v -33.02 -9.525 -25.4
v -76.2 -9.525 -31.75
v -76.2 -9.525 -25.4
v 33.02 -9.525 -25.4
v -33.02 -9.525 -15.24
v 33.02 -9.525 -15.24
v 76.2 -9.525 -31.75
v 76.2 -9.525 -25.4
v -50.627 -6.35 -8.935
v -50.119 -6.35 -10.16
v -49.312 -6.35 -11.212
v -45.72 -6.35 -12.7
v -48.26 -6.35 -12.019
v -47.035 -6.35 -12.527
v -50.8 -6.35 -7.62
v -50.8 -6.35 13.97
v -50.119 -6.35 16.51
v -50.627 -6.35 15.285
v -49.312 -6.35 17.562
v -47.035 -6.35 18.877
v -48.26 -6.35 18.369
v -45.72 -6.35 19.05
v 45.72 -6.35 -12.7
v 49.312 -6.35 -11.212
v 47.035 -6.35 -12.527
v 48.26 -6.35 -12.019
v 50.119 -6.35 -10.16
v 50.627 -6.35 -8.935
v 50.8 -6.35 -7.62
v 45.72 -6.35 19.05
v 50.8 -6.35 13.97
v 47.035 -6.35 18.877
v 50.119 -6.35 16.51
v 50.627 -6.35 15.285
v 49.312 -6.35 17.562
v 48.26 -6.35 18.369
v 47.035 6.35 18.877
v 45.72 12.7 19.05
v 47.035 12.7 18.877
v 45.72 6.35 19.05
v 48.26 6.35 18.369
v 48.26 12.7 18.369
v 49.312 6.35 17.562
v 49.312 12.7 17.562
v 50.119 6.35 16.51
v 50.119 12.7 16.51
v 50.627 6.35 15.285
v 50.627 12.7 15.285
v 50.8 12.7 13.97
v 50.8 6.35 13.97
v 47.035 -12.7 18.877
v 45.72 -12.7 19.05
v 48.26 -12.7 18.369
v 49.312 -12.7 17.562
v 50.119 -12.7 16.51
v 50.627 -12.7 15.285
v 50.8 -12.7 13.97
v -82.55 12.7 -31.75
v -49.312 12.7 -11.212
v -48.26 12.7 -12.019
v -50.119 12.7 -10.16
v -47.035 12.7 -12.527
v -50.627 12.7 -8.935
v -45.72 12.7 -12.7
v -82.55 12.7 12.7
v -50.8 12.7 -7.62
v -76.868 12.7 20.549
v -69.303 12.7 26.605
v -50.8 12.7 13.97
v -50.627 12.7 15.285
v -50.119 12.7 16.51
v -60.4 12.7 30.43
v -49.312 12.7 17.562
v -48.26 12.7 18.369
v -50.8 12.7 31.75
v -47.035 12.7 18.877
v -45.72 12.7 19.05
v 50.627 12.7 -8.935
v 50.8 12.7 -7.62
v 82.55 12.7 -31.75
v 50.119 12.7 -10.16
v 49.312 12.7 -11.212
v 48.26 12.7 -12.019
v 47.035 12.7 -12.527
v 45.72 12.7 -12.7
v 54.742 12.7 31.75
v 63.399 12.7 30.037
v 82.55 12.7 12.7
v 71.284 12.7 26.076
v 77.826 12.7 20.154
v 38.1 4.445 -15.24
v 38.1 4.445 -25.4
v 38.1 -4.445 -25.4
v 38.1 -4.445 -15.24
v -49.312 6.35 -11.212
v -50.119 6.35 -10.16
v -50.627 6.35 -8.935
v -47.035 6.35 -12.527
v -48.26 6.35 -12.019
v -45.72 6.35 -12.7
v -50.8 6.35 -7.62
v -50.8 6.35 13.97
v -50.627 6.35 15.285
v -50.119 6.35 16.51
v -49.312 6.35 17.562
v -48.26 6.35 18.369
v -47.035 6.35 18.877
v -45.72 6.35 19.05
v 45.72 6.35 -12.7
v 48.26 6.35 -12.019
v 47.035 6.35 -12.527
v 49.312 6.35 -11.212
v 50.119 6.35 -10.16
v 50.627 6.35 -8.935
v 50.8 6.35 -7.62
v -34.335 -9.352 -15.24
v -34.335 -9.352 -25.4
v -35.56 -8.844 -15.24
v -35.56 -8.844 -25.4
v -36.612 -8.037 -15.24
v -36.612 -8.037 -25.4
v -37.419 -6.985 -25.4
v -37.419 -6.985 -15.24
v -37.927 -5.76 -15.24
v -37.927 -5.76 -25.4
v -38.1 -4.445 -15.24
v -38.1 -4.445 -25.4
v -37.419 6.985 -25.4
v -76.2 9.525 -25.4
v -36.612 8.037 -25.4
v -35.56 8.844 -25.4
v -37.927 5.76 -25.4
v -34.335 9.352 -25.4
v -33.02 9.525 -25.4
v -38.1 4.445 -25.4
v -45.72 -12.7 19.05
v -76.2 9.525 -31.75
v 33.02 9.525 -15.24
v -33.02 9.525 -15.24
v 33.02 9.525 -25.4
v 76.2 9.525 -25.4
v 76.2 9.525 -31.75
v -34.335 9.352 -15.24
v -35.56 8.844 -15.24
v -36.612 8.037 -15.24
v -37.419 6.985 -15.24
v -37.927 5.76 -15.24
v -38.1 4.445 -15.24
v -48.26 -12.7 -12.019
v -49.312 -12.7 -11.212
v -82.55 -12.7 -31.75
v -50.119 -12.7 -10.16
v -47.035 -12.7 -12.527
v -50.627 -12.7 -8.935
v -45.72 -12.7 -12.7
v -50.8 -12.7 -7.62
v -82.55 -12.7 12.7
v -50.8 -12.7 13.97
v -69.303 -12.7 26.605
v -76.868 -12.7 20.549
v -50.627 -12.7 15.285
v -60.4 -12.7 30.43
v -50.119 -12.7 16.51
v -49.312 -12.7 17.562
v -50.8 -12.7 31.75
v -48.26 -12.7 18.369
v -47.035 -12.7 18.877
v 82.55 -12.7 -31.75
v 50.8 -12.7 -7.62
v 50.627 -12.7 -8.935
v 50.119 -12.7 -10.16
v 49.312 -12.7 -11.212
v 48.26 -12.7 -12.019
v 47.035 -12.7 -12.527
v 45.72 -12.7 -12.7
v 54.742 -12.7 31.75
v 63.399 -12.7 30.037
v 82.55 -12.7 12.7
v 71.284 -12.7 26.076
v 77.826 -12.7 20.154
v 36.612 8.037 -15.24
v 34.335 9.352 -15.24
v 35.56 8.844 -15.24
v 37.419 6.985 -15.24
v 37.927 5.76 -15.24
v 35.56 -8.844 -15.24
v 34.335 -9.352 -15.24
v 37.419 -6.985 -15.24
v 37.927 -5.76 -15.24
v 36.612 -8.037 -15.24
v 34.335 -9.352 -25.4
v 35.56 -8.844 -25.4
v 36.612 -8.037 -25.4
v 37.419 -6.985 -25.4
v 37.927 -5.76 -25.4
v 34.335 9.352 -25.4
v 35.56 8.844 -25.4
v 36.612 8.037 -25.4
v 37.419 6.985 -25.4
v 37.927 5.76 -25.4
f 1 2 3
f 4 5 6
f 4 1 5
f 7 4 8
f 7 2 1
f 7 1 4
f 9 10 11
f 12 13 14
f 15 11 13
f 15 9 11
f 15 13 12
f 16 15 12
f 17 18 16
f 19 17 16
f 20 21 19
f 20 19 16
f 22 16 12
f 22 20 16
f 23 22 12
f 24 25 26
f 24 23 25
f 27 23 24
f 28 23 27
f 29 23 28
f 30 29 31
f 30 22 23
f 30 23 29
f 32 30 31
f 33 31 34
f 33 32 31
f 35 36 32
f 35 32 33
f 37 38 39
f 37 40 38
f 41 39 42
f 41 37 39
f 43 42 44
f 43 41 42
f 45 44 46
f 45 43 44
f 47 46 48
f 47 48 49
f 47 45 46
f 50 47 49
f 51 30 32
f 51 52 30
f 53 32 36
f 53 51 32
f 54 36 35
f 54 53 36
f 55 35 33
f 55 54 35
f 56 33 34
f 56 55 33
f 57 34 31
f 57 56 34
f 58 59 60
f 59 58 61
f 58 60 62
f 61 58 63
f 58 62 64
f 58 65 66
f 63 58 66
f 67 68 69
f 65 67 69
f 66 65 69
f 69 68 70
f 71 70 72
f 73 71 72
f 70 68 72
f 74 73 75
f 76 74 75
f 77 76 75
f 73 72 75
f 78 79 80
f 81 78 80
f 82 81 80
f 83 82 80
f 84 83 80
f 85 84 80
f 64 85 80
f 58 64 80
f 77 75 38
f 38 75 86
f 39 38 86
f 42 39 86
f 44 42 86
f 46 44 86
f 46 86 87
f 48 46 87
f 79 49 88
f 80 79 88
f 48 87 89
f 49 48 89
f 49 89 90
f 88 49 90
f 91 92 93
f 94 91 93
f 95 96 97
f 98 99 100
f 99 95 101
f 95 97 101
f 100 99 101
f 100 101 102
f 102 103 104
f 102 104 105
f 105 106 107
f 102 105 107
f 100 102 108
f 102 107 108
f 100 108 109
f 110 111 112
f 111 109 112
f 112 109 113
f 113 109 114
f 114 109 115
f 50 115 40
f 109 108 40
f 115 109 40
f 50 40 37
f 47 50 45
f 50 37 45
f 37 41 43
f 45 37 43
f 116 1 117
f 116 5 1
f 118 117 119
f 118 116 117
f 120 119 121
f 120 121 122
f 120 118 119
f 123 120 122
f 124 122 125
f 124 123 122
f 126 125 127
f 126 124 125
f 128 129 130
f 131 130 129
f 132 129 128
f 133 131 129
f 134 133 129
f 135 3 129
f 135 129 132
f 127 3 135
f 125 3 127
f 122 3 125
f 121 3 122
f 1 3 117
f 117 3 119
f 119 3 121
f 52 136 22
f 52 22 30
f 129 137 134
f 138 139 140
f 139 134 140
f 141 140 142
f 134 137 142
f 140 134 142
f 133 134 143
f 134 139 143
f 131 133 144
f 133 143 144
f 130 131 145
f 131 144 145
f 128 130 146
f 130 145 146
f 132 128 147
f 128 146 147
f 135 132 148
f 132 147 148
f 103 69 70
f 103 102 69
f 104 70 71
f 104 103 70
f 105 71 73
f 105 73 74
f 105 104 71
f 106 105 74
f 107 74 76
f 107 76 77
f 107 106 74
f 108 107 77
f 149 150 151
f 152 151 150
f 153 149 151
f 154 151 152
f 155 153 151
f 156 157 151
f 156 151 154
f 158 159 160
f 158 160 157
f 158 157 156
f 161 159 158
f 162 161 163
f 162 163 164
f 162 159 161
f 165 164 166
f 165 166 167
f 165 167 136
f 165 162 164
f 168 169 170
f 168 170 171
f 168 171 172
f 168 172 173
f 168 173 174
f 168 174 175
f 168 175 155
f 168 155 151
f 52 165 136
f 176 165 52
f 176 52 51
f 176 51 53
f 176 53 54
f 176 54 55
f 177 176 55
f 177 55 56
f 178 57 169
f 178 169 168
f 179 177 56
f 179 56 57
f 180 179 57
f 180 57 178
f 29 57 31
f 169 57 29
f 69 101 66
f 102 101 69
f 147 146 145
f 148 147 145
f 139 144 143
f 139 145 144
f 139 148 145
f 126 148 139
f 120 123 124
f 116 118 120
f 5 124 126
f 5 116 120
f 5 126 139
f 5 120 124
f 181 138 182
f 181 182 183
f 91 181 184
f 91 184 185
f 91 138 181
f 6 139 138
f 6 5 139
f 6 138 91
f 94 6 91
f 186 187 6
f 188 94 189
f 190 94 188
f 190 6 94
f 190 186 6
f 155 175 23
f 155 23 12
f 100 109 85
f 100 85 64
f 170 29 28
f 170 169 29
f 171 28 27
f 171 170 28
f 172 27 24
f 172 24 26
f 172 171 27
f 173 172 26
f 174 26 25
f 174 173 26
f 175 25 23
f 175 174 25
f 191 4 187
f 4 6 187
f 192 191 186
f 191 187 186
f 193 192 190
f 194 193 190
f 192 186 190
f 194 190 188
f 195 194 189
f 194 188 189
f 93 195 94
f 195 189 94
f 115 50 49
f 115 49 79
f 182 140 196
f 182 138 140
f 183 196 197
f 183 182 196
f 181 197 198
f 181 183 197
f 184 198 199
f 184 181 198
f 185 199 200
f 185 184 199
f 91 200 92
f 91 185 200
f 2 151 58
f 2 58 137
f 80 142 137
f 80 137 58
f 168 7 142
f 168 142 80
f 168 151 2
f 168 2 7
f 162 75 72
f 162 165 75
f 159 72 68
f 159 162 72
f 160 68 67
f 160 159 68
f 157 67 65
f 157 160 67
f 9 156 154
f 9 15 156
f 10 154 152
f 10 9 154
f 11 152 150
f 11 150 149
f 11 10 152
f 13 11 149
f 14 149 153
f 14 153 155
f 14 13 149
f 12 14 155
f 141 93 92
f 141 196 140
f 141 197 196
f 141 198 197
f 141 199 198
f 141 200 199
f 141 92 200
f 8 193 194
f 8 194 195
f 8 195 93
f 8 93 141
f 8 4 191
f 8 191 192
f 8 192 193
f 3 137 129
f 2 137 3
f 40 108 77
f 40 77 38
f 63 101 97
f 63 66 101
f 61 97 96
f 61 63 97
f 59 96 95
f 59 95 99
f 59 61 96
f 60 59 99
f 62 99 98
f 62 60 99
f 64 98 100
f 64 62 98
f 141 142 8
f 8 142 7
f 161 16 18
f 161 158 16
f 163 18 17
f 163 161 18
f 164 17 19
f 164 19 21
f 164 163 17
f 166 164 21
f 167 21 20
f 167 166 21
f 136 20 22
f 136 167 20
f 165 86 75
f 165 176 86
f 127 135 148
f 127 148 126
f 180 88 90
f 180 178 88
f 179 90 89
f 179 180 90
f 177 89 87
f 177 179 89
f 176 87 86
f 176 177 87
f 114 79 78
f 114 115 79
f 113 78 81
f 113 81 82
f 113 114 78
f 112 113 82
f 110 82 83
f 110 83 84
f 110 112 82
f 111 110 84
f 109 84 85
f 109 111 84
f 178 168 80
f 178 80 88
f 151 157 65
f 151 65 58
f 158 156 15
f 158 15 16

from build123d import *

# Parameters (mm, degrees)
F0_W     = 101.6
F0_H     = 12.7
F1_DEPTH = 12.7
F0_H_2   = 31.75
F2_DEPTH = 6.35
F3_W     = 152.4
F3_H     = 19.05
F4_DEPTH = 6.35
F5_W     = 76.2
F5_H     = 19.05
F6_DEPTH = 10.16
F7_R     = 5.08


with BuildPart() as f1:
    # F0 (on Front) → F1 (new body, symmetric)
    with BuildSketch(Plane.XZ):
        with BuildLine():
            Line((-50.8, 19.05), (-50.8, 31.75))
            ThreePointArc((-50.8, 31.75), (-69.3027203169, 26.6045338614), (-82.55, 12.7))
            Line((-82.55, 12.7), (-82.55, -31.75))
            Line((-82.55, -31.75), (-50.8, -31.75))
            Line((-50.8, -31.75), (-50.8, -12.7))
            Line((-50.8, -12.7), (-50.8, 19.05))
        make_face()
        with Locations((0, 25.4)):
            Rectangle(F0_W, F0_H)
        with BuildLine():
            Line((54.74242965, 31.75), (50.8, 31.75))
            Line((50.8, 31.75), (50.8, 19.05))
            Line((50.8, 19.05), (50.8, -12.7))
            Line((50.8, -12.7), (-50.8, -12.7))
            Line((-50.8, -12.7), (-50.8, -31.75))
            Line((-50.8, -31.75), (82.55, -31.75))
            Line((82.55, -31.75), (82.55, 12.7))
            ThreePointArc((82.55, 12.7), (71.2844870911, 26.0761255456), (54.74242965, 31.75))
        make_face()
    extrude(amount=F1_DEPTH, both=True)

    # F0 (on Front) → F2 (join, symmetric)
    with BuildSketch(Plane.XZ):
        with Locations((0, 3.175)):
            Rectangle(F0_W, F0_H_2)
    extrude(amount=F2_DEPTH, both=True)

    # F3 (on face) → F4 (cut)
    with BuildSketch(Plane(origin=(0, 0, -31.75), x_dir=(1, 0, 0), z_dir=(0, 0, -1))):
        Rectangle(F3_W, F3_H)
    extrude(amount=-F4_DEPTH, mode=Mode.SUBTRACT)

    # F5 (on face) → F6 (cut)
    with BuildSketch(Plane(origin=(0, 0, -25.4), x_dir=(1, 0, 0), z_dir=(0, 0, -1))):
        Rectangle(F5_W, F5_H)
    extrude(amount=-F6_DEPTH, mode=Mode.SUBTRACT)

    # F7
    f7_edges = [f1.edges().sort_by_distance(p)[0] for p in [
        (-38.1, -9.525, -20.32),
        (38.1, -9.525, -20.32),
        (38.1, 9.525, -20.32),
        (-38.1, 9.525, -20.32),
        (-50.8, -9.525, 19.05),
        (-50.8, -9.525, -12.7),
        (50.8, -9.525, 19.05),
        (50.8, -9.525, -12.7),
        (50.8, 9.525, 19.05),
        (50.8, 9.525, -12.7),
        (-50.8, 9.525, 19.05),
        (-50.8, 9.525, -12.7),
    ]]
    fillet(f7_edges, radius=F7_R)


solid = f1.part
